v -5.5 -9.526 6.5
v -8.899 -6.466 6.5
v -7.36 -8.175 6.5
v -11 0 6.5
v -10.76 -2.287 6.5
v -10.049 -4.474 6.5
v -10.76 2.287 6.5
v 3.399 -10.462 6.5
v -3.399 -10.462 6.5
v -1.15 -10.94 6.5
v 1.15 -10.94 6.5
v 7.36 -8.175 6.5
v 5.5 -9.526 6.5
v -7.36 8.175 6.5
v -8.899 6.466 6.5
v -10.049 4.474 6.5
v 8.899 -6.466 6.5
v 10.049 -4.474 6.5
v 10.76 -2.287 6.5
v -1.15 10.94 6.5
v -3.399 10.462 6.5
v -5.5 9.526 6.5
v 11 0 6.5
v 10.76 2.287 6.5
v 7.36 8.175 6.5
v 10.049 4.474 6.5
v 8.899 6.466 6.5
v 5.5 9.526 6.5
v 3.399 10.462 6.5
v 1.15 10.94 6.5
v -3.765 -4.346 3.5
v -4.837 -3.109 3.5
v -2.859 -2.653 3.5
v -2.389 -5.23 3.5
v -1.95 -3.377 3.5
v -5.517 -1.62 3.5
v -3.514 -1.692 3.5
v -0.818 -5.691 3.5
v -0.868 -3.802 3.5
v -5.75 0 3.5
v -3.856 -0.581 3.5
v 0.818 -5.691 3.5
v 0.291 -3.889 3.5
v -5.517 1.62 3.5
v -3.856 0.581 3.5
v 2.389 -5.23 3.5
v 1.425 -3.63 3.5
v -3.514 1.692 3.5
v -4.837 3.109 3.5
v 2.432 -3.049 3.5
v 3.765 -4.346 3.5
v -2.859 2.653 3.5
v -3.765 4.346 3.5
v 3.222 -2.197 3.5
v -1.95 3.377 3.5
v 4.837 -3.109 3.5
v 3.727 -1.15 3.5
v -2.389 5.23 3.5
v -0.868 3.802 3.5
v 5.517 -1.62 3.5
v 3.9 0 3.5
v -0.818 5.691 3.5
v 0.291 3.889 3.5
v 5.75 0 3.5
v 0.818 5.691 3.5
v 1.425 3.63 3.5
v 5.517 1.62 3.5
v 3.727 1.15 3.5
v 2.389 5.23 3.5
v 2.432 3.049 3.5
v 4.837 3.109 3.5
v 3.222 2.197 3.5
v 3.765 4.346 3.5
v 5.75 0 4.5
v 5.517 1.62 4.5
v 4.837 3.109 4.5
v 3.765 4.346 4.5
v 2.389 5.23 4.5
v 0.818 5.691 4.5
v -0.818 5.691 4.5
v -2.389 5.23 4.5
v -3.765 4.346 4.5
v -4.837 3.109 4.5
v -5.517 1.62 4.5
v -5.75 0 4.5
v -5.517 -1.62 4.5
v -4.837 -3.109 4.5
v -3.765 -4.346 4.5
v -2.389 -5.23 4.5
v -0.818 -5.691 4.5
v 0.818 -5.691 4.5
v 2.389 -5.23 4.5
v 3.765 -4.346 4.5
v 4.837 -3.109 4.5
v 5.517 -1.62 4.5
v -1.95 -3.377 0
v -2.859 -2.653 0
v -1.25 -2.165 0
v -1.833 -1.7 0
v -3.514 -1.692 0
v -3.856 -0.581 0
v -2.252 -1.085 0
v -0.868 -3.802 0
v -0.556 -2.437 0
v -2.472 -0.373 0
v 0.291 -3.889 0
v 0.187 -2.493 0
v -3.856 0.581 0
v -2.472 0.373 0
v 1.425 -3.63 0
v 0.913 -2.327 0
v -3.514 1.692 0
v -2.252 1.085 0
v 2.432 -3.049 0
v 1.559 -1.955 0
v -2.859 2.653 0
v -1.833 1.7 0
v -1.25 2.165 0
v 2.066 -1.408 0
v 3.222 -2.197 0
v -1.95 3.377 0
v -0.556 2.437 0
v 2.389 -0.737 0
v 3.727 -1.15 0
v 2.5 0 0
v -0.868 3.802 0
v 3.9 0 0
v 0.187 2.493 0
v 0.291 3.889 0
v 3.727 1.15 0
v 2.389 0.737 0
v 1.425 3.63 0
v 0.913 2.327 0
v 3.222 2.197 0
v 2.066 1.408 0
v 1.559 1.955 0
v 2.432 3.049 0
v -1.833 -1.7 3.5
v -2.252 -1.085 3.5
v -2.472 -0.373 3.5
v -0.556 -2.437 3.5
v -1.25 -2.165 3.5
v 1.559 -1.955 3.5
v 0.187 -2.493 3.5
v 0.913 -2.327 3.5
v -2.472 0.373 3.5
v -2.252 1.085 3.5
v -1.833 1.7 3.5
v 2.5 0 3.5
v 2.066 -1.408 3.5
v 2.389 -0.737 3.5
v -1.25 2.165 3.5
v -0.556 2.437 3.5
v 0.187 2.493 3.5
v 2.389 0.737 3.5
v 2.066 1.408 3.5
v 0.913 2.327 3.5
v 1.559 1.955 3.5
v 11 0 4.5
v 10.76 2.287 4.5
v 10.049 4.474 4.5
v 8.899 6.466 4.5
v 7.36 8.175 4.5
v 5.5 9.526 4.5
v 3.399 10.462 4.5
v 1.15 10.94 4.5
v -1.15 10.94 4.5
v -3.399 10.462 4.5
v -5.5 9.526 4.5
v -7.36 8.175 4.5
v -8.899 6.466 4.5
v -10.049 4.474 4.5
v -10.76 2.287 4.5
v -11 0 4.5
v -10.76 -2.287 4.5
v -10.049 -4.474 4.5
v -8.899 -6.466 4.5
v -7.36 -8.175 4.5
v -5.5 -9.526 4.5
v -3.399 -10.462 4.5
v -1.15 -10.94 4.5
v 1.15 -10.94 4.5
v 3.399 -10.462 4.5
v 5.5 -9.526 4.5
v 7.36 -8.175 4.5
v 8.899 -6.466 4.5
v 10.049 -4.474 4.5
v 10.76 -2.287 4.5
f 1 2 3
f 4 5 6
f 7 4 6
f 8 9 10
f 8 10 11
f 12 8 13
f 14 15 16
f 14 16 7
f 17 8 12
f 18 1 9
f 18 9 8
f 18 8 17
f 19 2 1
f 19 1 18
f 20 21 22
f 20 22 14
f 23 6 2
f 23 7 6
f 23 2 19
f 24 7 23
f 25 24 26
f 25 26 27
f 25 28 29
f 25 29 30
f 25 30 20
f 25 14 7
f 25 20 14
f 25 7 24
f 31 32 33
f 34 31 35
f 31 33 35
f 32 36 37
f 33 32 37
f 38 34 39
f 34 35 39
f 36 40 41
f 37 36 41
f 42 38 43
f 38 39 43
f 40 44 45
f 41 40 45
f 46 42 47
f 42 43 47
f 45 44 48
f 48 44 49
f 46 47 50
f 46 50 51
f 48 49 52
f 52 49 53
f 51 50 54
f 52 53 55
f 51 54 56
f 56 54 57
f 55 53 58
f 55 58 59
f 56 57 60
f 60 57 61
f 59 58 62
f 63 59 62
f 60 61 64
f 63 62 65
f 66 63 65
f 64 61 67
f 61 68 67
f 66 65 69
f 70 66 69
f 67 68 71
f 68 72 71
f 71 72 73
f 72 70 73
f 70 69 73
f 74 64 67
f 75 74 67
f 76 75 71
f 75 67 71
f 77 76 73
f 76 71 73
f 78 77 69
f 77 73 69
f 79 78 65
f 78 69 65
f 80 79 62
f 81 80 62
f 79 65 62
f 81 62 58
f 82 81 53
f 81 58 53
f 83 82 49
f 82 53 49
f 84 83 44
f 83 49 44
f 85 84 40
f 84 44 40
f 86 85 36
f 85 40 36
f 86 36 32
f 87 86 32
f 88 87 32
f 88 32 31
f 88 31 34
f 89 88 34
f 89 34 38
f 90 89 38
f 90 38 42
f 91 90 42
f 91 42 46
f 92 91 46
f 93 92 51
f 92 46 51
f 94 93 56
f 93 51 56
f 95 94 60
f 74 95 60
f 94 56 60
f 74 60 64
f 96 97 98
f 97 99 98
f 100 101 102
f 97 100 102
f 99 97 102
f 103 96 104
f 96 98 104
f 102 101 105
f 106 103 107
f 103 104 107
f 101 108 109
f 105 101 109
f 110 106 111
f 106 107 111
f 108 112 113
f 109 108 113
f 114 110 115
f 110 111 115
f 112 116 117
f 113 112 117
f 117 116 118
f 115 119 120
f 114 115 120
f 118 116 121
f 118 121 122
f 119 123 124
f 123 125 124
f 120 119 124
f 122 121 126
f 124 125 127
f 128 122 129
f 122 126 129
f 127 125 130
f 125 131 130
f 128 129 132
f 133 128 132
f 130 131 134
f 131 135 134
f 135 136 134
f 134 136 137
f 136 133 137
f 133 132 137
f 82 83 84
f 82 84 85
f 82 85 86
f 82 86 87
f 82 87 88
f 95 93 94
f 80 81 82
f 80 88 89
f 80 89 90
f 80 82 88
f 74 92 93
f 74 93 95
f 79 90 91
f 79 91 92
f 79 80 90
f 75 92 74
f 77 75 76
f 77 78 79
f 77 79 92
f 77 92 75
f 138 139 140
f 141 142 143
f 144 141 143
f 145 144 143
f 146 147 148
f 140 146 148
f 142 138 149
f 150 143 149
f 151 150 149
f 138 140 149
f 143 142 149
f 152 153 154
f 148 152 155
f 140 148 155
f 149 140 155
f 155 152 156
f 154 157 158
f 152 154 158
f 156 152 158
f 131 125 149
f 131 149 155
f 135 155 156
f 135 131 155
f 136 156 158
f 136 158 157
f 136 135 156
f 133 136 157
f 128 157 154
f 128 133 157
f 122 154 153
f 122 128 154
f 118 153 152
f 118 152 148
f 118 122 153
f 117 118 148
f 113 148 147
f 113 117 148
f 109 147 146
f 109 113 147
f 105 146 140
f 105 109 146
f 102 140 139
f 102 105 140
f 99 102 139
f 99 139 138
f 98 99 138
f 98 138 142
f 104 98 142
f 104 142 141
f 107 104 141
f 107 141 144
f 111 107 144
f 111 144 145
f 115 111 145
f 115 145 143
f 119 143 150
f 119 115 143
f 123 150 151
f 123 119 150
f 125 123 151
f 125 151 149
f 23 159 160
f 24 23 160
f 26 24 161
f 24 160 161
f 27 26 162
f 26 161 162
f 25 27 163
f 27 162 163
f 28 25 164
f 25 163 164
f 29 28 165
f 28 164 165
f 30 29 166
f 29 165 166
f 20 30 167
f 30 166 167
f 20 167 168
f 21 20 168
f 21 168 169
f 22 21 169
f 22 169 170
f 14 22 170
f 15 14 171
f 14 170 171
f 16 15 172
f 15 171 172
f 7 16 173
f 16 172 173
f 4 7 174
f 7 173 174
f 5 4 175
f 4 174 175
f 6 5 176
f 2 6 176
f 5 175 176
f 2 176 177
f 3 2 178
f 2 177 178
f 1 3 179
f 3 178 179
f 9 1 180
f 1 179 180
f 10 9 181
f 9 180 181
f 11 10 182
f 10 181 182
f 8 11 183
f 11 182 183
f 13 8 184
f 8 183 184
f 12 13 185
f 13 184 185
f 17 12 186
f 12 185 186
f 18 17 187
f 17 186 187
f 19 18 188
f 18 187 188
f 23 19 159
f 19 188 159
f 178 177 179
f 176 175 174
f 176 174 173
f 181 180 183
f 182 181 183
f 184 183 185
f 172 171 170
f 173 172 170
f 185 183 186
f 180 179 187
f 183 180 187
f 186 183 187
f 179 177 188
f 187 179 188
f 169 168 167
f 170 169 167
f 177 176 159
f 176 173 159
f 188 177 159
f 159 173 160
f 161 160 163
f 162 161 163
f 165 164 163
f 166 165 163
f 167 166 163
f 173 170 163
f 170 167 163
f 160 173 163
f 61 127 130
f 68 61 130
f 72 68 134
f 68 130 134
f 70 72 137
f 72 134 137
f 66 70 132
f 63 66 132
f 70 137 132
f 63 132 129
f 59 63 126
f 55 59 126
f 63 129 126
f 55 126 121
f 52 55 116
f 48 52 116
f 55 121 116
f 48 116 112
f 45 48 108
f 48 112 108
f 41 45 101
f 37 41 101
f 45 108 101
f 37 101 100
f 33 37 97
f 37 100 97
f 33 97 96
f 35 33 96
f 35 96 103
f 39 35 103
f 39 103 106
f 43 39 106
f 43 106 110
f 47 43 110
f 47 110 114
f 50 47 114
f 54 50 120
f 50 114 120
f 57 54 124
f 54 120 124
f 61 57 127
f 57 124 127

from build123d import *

# Parameters (mm, degrees)
F1_START = 4.5
F0_R     = 11
F1_DEPTH = 2
F2_R     = 3.9
F2_R_2   = 2.5
F3_DEPTH = 3.5
F5_START = 3.5
F4_R     = 5.75
F5_DEPTH = 1


with BuildPart() as f1:
    # F0 (on Top) → F1 (new body)
    with BuildSketch(Plane.XY.offset(F1_START)):
        Circle(F0_R)
    extrude(amount=F1_DEPTH)


with BuildPart() as f3:
    # F2 (on Top) → F3 (new body)
    with BuildSketch(Plane.XY):
        Circle(F2_R)
        Circle(F2_R_2, mode=Mode.SUBTRACT)
    extrude(amount=F3_DEPTH)

    # F4 (on Top) → F5 (join)
    with BuildSketch(Plane.XY.offset(F5_START)):
        Circle(F4_R)
    extrude(amount=F5_DEPTH)


solid = Compound([f1.part, f3.part])
